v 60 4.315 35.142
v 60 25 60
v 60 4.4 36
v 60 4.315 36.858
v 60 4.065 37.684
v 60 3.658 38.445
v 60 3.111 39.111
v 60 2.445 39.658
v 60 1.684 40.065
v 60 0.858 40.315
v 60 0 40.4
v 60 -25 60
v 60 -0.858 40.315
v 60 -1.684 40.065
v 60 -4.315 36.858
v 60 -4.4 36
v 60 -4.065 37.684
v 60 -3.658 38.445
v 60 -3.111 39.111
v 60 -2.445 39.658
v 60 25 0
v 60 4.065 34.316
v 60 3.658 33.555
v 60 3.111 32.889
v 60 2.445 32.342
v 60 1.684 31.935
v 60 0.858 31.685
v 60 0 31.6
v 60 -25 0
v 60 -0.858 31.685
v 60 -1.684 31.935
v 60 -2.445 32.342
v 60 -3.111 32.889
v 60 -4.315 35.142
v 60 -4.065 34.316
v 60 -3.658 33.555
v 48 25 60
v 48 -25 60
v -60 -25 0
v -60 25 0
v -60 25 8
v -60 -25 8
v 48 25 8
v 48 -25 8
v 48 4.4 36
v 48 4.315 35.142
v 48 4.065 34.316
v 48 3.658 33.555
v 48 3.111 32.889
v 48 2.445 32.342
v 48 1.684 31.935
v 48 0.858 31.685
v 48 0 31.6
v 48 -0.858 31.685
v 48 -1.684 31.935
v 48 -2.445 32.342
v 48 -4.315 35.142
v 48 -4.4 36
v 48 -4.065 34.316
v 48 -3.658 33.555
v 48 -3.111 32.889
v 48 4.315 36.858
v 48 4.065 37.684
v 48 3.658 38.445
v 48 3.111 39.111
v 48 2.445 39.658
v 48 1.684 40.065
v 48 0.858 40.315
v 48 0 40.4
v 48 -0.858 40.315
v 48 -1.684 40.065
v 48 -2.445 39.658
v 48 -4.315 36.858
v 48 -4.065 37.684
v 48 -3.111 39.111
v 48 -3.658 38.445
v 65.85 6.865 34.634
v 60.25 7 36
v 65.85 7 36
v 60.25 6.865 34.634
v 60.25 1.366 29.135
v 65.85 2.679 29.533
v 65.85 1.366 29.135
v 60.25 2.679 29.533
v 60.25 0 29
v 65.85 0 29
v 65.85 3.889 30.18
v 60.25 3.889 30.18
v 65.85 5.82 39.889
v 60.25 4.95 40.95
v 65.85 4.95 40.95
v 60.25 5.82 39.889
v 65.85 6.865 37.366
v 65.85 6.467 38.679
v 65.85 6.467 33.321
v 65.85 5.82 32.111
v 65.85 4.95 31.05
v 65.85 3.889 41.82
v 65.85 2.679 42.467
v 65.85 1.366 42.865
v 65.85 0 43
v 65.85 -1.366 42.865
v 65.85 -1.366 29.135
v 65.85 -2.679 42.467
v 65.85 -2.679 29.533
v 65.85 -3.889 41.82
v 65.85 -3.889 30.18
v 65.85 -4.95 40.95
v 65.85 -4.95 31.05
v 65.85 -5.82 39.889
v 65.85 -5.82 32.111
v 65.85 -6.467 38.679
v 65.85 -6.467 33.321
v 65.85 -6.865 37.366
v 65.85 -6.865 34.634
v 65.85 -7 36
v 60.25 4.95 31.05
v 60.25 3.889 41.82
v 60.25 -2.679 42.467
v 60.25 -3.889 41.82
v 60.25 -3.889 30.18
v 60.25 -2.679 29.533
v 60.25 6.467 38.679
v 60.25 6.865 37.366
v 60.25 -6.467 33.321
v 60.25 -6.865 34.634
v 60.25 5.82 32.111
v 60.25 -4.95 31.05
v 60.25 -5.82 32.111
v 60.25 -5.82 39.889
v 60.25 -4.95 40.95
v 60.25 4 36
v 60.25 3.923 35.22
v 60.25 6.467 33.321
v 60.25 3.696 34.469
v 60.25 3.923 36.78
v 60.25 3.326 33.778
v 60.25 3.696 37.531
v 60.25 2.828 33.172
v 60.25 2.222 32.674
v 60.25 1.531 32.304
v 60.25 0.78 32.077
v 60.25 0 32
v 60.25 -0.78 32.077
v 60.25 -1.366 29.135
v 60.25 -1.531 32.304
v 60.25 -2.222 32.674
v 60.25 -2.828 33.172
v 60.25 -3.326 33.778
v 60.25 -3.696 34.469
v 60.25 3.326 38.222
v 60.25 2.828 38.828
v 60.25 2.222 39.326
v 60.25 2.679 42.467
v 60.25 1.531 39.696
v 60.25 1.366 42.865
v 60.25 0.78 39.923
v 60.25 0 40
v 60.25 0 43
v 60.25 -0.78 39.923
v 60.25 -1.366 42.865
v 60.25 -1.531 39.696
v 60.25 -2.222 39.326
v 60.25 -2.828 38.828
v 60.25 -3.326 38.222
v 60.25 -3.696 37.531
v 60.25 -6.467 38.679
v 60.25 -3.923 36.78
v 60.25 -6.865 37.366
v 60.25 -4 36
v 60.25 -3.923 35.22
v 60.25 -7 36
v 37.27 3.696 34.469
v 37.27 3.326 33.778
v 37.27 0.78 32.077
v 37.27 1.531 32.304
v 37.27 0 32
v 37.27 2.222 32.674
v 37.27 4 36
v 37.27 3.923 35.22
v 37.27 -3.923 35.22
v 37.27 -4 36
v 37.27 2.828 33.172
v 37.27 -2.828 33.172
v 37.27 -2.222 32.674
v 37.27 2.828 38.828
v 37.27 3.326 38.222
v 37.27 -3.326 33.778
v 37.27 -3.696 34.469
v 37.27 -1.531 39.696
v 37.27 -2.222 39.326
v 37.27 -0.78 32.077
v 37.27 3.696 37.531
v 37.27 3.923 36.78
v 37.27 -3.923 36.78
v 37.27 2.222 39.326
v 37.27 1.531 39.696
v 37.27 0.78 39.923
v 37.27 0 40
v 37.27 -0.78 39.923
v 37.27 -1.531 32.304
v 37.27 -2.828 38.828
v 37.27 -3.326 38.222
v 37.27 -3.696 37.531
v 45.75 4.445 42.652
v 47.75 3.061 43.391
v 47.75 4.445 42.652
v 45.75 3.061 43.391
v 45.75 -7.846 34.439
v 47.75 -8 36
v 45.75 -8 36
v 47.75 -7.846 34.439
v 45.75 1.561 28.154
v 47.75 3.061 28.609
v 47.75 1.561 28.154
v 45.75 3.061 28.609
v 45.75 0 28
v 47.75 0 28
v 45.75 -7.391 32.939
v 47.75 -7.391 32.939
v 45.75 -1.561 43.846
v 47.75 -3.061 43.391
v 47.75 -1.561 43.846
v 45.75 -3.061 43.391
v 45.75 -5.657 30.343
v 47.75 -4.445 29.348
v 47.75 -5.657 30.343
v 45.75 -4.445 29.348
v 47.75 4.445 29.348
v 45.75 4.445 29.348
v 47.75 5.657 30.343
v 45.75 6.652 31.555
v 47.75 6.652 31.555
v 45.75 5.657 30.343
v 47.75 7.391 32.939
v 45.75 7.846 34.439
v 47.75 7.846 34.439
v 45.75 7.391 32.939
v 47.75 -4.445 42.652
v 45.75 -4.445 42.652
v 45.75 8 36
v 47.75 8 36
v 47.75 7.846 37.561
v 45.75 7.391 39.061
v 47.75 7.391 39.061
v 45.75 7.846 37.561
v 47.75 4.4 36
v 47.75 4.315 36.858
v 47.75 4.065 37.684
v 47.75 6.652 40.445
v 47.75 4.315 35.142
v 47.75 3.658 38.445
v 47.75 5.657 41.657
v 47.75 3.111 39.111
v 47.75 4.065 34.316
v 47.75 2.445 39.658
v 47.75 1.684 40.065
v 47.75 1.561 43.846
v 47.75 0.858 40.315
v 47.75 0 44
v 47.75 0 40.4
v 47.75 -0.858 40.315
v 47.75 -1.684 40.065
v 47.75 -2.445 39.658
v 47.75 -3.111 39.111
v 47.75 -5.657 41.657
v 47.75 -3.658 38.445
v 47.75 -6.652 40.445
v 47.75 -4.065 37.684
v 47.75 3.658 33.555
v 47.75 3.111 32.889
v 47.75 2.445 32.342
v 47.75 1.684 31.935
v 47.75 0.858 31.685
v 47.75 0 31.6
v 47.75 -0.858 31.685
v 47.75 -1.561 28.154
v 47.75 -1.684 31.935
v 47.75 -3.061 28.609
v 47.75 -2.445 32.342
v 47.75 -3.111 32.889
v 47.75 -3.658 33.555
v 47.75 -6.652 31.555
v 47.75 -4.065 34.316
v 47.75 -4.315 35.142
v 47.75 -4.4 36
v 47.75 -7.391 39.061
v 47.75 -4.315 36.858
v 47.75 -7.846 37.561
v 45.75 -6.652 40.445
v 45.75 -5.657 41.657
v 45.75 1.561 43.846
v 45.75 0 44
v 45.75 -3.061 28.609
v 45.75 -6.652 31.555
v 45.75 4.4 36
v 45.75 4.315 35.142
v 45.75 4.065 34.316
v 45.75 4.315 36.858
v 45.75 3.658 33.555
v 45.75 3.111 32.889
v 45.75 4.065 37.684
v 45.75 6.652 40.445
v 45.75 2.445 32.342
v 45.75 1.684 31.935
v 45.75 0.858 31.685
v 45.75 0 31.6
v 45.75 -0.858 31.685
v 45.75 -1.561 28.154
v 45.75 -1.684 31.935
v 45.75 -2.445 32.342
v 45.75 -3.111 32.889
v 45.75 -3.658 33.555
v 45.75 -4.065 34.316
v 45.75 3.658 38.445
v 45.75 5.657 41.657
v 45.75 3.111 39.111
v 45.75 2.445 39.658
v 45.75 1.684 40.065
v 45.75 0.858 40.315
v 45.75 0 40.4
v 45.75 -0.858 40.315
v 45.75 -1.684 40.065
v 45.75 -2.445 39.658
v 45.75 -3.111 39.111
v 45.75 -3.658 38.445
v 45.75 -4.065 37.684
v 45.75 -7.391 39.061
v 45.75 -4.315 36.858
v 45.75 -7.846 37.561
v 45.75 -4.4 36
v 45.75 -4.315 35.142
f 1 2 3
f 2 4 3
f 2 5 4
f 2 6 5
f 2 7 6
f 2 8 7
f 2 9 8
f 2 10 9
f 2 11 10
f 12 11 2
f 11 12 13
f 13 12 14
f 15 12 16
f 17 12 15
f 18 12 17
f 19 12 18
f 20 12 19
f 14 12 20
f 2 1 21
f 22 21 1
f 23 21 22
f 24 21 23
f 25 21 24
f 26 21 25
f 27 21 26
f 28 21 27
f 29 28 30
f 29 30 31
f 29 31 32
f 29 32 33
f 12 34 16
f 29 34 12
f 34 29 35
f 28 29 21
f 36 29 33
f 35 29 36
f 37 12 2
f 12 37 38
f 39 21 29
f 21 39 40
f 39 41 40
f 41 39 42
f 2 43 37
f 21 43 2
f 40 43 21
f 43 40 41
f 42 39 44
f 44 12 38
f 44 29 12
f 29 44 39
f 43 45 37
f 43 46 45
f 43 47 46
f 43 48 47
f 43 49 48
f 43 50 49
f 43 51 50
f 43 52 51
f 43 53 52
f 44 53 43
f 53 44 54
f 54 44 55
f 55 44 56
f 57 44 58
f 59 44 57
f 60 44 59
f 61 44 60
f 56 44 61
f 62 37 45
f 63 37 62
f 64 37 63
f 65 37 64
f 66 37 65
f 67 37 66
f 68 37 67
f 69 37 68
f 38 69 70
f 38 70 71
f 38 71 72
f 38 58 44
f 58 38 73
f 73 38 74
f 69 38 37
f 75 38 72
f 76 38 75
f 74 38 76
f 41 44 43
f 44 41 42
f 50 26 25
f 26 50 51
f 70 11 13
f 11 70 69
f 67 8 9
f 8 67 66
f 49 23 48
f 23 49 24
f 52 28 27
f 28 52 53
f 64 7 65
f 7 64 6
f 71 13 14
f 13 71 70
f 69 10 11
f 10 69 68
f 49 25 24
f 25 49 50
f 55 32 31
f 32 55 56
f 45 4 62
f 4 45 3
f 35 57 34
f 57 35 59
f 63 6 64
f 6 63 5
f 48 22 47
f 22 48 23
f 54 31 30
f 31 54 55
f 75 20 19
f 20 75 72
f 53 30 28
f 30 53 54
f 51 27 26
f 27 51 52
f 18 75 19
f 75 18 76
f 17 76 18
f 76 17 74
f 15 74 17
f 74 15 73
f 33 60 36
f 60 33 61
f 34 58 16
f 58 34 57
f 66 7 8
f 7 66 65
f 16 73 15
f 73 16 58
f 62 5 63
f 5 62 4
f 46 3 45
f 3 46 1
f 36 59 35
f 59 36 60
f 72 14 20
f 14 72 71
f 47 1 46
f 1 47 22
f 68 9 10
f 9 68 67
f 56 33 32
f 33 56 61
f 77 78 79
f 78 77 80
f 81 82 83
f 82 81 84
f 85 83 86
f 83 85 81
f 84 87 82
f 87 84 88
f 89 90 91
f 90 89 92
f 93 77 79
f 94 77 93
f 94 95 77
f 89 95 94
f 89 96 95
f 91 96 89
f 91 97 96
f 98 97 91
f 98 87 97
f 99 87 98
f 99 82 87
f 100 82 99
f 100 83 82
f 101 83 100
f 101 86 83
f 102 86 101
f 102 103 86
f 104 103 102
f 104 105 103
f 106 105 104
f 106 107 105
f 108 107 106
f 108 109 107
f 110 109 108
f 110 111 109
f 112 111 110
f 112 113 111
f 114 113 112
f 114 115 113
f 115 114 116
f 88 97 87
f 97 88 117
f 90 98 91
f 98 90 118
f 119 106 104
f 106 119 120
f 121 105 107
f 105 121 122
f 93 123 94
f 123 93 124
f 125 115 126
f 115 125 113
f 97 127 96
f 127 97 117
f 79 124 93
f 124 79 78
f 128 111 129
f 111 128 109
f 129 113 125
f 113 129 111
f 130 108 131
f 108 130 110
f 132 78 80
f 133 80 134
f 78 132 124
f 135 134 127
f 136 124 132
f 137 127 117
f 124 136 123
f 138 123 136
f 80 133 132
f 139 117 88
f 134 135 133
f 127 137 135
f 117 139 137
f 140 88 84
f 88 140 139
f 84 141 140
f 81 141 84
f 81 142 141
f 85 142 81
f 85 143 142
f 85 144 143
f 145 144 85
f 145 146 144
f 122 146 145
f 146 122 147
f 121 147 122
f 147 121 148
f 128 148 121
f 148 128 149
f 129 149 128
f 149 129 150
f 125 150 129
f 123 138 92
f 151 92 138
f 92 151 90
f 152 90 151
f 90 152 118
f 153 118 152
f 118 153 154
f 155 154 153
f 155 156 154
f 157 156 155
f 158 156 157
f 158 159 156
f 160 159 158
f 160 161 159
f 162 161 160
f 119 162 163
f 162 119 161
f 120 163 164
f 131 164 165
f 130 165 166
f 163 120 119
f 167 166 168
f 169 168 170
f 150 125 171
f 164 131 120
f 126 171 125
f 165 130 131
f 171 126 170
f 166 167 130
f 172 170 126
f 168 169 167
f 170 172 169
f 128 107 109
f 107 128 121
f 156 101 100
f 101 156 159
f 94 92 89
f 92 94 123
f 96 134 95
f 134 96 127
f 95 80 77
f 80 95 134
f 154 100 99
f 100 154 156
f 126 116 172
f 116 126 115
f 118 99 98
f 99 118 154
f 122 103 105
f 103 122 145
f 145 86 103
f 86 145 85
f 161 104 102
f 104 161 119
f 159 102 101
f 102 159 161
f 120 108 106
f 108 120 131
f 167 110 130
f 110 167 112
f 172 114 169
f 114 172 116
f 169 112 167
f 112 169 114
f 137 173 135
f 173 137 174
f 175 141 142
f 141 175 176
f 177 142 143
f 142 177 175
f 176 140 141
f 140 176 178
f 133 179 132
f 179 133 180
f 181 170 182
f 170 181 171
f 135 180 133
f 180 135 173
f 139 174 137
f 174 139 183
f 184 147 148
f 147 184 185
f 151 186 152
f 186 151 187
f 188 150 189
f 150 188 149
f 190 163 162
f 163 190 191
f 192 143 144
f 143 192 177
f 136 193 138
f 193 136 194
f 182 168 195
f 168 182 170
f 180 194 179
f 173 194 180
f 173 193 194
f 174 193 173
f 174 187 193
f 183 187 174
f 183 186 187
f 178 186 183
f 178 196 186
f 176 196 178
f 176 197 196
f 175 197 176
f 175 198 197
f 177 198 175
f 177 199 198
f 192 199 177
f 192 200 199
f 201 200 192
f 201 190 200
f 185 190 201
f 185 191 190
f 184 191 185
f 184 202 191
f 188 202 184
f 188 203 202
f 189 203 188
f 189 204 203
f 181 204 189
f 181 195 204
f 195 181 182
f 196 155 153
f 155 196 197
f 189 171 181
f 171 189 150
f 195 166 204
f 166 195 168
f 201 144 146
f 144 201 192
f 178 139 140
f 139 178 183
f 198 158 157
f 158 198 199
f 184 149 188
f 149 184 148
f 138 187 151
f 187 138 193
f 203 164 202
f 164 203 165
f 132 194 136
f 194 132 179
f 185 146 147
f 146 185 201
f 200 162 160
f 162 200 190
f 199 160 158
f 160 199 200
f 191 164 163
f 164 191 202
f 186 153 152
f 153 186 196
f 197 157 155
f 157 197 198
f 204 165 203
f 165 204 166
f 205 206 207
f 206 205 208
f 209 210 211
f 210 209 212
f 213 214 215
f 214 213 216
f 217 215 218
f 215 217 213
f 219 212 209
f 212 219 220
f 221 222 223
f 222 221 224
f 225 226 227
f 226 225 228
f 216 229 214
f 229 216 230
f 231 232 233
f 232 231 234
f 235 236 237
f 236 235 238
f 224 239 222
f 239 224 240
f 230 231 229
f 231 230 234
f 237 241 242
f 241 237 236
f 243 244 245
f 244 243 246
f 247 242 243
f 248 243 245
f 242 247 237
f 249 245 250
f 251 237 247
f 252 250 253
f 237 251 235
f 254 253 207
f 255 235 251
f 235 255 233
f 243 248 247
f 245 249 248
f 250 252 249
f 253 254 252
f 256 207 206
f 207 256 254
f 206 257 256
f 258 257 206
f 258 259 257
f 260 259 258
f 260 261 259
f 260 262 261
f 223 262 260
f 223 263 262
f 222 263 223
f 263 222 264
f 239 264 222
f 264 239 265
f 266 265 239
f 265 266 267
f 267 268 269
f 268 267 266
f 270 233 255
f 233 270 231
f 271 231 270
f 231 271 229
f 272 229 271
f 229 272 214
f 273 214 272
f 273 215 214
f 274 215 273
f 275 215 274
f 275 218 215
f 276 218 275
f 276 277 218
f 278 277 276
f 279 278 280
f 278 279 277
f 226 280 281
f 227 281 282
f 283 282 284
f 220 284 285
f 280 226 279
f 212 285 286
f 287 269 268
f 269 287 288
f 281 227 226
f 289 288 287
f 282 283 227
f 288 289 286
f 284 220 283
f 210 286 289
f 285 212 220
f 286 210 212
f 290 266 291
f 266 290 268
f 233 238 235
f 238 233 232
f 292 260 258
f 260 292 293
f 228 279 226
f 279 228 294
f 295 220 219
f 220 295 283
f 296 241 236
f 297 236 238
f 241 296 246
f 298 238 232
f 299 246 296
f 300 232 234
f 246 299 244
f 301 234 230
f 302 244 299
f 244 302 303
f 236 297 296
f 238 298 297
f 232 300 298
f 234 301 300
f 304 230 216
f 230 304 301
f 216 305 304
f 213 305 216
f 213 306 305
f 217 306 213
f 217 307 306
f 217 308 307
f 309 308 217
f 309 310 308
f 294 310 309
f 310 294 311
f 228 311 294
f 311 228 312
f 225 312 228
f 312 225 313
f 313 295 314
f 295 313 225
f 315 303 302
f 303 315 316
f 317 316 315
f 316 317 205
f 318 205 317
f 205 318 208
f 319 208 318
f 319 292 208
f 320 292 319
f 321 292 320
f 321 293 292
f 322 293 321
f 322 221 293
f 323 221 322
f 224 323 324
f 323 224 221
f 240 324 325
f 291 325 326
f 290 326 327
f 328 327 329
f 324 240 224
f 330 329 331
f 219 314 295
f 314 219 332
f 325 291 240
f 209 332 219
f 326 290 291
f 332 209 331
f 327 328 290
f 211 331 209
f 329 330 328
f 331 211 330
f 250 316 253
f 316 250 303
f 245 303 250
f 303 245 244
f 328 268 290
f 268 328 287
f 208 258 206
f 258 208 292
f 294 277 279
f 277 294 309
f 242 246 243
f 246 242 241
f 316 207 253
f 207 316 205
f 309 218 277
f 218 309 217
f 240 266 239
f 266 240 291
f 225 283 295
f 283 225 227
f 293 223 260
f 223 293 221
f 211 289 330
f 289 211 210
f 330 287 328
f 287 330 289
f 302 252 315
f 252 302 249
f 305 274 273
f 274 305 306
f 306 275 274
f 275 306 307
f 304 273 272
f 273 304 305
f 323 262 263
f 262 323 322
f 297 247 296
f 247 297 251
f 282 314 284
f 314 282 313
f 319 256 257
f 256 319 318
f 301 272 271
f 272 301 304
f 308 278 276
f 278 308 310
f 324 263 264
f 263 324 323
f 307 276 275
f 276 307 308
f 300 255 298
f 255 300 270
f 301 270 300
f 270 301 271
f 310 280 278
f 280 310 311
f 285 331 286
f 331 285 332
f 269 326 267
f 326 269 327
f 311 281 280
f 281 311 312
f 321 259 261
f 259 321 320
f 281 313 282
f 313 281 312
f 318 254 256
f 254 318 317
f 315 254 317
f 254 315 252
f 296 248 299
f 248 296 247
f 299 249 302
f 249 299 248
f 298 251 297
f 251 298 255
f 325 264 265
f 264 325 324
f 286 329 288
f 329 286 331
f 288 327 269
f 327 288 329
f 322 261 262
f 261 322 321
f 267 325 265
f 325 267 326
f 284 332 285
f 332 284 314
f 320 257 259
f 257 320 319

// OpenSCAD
$fn = 32;

// ------------------------------------------------------------------------
// Bolted bracket: 120 x 50 mm bracket with 1 bolt joints
// Every part is its own module, assembly() places them once.
// ------------------------------------------------------------------------

// --- part 1 ---
module bracket() {
  difference() {
    translate([-60, -25, 0]) cube([120, 50, 60]);
    translate([-61, -26, 8]) cube([109, 52, 53]);
    translate([54, 0, 36]) rotate([0, 90, 0]) cylinder(h = 14, d = 8.8, center = true);
  }
}

// --- part 2 ---
module bolt() {
  cylinder(h = 5.6, d = 14);
  translate([0, 0, -22.98]) cylinder(h = 22.98, d = 8);
}

// --- part 3 ---
module washer() {
  difference() {
      translate([0, 0, 0]) cylinder(h = 2, d = 16);
      translate([0, 0, -1]) cylinder(h = 4, d = 8.8);
    }
}

// --- assembly ---
module assembly() {
  translate([0, 0, 0]) rotate([0, 0, 0]) bracket();
  translate([60.25, 0, 36]) rotate([0, 90, 0]) bolt();
  translate([45.75, 0, 36]) rotate([0, 90, 0]) washer();
}

assembly();
